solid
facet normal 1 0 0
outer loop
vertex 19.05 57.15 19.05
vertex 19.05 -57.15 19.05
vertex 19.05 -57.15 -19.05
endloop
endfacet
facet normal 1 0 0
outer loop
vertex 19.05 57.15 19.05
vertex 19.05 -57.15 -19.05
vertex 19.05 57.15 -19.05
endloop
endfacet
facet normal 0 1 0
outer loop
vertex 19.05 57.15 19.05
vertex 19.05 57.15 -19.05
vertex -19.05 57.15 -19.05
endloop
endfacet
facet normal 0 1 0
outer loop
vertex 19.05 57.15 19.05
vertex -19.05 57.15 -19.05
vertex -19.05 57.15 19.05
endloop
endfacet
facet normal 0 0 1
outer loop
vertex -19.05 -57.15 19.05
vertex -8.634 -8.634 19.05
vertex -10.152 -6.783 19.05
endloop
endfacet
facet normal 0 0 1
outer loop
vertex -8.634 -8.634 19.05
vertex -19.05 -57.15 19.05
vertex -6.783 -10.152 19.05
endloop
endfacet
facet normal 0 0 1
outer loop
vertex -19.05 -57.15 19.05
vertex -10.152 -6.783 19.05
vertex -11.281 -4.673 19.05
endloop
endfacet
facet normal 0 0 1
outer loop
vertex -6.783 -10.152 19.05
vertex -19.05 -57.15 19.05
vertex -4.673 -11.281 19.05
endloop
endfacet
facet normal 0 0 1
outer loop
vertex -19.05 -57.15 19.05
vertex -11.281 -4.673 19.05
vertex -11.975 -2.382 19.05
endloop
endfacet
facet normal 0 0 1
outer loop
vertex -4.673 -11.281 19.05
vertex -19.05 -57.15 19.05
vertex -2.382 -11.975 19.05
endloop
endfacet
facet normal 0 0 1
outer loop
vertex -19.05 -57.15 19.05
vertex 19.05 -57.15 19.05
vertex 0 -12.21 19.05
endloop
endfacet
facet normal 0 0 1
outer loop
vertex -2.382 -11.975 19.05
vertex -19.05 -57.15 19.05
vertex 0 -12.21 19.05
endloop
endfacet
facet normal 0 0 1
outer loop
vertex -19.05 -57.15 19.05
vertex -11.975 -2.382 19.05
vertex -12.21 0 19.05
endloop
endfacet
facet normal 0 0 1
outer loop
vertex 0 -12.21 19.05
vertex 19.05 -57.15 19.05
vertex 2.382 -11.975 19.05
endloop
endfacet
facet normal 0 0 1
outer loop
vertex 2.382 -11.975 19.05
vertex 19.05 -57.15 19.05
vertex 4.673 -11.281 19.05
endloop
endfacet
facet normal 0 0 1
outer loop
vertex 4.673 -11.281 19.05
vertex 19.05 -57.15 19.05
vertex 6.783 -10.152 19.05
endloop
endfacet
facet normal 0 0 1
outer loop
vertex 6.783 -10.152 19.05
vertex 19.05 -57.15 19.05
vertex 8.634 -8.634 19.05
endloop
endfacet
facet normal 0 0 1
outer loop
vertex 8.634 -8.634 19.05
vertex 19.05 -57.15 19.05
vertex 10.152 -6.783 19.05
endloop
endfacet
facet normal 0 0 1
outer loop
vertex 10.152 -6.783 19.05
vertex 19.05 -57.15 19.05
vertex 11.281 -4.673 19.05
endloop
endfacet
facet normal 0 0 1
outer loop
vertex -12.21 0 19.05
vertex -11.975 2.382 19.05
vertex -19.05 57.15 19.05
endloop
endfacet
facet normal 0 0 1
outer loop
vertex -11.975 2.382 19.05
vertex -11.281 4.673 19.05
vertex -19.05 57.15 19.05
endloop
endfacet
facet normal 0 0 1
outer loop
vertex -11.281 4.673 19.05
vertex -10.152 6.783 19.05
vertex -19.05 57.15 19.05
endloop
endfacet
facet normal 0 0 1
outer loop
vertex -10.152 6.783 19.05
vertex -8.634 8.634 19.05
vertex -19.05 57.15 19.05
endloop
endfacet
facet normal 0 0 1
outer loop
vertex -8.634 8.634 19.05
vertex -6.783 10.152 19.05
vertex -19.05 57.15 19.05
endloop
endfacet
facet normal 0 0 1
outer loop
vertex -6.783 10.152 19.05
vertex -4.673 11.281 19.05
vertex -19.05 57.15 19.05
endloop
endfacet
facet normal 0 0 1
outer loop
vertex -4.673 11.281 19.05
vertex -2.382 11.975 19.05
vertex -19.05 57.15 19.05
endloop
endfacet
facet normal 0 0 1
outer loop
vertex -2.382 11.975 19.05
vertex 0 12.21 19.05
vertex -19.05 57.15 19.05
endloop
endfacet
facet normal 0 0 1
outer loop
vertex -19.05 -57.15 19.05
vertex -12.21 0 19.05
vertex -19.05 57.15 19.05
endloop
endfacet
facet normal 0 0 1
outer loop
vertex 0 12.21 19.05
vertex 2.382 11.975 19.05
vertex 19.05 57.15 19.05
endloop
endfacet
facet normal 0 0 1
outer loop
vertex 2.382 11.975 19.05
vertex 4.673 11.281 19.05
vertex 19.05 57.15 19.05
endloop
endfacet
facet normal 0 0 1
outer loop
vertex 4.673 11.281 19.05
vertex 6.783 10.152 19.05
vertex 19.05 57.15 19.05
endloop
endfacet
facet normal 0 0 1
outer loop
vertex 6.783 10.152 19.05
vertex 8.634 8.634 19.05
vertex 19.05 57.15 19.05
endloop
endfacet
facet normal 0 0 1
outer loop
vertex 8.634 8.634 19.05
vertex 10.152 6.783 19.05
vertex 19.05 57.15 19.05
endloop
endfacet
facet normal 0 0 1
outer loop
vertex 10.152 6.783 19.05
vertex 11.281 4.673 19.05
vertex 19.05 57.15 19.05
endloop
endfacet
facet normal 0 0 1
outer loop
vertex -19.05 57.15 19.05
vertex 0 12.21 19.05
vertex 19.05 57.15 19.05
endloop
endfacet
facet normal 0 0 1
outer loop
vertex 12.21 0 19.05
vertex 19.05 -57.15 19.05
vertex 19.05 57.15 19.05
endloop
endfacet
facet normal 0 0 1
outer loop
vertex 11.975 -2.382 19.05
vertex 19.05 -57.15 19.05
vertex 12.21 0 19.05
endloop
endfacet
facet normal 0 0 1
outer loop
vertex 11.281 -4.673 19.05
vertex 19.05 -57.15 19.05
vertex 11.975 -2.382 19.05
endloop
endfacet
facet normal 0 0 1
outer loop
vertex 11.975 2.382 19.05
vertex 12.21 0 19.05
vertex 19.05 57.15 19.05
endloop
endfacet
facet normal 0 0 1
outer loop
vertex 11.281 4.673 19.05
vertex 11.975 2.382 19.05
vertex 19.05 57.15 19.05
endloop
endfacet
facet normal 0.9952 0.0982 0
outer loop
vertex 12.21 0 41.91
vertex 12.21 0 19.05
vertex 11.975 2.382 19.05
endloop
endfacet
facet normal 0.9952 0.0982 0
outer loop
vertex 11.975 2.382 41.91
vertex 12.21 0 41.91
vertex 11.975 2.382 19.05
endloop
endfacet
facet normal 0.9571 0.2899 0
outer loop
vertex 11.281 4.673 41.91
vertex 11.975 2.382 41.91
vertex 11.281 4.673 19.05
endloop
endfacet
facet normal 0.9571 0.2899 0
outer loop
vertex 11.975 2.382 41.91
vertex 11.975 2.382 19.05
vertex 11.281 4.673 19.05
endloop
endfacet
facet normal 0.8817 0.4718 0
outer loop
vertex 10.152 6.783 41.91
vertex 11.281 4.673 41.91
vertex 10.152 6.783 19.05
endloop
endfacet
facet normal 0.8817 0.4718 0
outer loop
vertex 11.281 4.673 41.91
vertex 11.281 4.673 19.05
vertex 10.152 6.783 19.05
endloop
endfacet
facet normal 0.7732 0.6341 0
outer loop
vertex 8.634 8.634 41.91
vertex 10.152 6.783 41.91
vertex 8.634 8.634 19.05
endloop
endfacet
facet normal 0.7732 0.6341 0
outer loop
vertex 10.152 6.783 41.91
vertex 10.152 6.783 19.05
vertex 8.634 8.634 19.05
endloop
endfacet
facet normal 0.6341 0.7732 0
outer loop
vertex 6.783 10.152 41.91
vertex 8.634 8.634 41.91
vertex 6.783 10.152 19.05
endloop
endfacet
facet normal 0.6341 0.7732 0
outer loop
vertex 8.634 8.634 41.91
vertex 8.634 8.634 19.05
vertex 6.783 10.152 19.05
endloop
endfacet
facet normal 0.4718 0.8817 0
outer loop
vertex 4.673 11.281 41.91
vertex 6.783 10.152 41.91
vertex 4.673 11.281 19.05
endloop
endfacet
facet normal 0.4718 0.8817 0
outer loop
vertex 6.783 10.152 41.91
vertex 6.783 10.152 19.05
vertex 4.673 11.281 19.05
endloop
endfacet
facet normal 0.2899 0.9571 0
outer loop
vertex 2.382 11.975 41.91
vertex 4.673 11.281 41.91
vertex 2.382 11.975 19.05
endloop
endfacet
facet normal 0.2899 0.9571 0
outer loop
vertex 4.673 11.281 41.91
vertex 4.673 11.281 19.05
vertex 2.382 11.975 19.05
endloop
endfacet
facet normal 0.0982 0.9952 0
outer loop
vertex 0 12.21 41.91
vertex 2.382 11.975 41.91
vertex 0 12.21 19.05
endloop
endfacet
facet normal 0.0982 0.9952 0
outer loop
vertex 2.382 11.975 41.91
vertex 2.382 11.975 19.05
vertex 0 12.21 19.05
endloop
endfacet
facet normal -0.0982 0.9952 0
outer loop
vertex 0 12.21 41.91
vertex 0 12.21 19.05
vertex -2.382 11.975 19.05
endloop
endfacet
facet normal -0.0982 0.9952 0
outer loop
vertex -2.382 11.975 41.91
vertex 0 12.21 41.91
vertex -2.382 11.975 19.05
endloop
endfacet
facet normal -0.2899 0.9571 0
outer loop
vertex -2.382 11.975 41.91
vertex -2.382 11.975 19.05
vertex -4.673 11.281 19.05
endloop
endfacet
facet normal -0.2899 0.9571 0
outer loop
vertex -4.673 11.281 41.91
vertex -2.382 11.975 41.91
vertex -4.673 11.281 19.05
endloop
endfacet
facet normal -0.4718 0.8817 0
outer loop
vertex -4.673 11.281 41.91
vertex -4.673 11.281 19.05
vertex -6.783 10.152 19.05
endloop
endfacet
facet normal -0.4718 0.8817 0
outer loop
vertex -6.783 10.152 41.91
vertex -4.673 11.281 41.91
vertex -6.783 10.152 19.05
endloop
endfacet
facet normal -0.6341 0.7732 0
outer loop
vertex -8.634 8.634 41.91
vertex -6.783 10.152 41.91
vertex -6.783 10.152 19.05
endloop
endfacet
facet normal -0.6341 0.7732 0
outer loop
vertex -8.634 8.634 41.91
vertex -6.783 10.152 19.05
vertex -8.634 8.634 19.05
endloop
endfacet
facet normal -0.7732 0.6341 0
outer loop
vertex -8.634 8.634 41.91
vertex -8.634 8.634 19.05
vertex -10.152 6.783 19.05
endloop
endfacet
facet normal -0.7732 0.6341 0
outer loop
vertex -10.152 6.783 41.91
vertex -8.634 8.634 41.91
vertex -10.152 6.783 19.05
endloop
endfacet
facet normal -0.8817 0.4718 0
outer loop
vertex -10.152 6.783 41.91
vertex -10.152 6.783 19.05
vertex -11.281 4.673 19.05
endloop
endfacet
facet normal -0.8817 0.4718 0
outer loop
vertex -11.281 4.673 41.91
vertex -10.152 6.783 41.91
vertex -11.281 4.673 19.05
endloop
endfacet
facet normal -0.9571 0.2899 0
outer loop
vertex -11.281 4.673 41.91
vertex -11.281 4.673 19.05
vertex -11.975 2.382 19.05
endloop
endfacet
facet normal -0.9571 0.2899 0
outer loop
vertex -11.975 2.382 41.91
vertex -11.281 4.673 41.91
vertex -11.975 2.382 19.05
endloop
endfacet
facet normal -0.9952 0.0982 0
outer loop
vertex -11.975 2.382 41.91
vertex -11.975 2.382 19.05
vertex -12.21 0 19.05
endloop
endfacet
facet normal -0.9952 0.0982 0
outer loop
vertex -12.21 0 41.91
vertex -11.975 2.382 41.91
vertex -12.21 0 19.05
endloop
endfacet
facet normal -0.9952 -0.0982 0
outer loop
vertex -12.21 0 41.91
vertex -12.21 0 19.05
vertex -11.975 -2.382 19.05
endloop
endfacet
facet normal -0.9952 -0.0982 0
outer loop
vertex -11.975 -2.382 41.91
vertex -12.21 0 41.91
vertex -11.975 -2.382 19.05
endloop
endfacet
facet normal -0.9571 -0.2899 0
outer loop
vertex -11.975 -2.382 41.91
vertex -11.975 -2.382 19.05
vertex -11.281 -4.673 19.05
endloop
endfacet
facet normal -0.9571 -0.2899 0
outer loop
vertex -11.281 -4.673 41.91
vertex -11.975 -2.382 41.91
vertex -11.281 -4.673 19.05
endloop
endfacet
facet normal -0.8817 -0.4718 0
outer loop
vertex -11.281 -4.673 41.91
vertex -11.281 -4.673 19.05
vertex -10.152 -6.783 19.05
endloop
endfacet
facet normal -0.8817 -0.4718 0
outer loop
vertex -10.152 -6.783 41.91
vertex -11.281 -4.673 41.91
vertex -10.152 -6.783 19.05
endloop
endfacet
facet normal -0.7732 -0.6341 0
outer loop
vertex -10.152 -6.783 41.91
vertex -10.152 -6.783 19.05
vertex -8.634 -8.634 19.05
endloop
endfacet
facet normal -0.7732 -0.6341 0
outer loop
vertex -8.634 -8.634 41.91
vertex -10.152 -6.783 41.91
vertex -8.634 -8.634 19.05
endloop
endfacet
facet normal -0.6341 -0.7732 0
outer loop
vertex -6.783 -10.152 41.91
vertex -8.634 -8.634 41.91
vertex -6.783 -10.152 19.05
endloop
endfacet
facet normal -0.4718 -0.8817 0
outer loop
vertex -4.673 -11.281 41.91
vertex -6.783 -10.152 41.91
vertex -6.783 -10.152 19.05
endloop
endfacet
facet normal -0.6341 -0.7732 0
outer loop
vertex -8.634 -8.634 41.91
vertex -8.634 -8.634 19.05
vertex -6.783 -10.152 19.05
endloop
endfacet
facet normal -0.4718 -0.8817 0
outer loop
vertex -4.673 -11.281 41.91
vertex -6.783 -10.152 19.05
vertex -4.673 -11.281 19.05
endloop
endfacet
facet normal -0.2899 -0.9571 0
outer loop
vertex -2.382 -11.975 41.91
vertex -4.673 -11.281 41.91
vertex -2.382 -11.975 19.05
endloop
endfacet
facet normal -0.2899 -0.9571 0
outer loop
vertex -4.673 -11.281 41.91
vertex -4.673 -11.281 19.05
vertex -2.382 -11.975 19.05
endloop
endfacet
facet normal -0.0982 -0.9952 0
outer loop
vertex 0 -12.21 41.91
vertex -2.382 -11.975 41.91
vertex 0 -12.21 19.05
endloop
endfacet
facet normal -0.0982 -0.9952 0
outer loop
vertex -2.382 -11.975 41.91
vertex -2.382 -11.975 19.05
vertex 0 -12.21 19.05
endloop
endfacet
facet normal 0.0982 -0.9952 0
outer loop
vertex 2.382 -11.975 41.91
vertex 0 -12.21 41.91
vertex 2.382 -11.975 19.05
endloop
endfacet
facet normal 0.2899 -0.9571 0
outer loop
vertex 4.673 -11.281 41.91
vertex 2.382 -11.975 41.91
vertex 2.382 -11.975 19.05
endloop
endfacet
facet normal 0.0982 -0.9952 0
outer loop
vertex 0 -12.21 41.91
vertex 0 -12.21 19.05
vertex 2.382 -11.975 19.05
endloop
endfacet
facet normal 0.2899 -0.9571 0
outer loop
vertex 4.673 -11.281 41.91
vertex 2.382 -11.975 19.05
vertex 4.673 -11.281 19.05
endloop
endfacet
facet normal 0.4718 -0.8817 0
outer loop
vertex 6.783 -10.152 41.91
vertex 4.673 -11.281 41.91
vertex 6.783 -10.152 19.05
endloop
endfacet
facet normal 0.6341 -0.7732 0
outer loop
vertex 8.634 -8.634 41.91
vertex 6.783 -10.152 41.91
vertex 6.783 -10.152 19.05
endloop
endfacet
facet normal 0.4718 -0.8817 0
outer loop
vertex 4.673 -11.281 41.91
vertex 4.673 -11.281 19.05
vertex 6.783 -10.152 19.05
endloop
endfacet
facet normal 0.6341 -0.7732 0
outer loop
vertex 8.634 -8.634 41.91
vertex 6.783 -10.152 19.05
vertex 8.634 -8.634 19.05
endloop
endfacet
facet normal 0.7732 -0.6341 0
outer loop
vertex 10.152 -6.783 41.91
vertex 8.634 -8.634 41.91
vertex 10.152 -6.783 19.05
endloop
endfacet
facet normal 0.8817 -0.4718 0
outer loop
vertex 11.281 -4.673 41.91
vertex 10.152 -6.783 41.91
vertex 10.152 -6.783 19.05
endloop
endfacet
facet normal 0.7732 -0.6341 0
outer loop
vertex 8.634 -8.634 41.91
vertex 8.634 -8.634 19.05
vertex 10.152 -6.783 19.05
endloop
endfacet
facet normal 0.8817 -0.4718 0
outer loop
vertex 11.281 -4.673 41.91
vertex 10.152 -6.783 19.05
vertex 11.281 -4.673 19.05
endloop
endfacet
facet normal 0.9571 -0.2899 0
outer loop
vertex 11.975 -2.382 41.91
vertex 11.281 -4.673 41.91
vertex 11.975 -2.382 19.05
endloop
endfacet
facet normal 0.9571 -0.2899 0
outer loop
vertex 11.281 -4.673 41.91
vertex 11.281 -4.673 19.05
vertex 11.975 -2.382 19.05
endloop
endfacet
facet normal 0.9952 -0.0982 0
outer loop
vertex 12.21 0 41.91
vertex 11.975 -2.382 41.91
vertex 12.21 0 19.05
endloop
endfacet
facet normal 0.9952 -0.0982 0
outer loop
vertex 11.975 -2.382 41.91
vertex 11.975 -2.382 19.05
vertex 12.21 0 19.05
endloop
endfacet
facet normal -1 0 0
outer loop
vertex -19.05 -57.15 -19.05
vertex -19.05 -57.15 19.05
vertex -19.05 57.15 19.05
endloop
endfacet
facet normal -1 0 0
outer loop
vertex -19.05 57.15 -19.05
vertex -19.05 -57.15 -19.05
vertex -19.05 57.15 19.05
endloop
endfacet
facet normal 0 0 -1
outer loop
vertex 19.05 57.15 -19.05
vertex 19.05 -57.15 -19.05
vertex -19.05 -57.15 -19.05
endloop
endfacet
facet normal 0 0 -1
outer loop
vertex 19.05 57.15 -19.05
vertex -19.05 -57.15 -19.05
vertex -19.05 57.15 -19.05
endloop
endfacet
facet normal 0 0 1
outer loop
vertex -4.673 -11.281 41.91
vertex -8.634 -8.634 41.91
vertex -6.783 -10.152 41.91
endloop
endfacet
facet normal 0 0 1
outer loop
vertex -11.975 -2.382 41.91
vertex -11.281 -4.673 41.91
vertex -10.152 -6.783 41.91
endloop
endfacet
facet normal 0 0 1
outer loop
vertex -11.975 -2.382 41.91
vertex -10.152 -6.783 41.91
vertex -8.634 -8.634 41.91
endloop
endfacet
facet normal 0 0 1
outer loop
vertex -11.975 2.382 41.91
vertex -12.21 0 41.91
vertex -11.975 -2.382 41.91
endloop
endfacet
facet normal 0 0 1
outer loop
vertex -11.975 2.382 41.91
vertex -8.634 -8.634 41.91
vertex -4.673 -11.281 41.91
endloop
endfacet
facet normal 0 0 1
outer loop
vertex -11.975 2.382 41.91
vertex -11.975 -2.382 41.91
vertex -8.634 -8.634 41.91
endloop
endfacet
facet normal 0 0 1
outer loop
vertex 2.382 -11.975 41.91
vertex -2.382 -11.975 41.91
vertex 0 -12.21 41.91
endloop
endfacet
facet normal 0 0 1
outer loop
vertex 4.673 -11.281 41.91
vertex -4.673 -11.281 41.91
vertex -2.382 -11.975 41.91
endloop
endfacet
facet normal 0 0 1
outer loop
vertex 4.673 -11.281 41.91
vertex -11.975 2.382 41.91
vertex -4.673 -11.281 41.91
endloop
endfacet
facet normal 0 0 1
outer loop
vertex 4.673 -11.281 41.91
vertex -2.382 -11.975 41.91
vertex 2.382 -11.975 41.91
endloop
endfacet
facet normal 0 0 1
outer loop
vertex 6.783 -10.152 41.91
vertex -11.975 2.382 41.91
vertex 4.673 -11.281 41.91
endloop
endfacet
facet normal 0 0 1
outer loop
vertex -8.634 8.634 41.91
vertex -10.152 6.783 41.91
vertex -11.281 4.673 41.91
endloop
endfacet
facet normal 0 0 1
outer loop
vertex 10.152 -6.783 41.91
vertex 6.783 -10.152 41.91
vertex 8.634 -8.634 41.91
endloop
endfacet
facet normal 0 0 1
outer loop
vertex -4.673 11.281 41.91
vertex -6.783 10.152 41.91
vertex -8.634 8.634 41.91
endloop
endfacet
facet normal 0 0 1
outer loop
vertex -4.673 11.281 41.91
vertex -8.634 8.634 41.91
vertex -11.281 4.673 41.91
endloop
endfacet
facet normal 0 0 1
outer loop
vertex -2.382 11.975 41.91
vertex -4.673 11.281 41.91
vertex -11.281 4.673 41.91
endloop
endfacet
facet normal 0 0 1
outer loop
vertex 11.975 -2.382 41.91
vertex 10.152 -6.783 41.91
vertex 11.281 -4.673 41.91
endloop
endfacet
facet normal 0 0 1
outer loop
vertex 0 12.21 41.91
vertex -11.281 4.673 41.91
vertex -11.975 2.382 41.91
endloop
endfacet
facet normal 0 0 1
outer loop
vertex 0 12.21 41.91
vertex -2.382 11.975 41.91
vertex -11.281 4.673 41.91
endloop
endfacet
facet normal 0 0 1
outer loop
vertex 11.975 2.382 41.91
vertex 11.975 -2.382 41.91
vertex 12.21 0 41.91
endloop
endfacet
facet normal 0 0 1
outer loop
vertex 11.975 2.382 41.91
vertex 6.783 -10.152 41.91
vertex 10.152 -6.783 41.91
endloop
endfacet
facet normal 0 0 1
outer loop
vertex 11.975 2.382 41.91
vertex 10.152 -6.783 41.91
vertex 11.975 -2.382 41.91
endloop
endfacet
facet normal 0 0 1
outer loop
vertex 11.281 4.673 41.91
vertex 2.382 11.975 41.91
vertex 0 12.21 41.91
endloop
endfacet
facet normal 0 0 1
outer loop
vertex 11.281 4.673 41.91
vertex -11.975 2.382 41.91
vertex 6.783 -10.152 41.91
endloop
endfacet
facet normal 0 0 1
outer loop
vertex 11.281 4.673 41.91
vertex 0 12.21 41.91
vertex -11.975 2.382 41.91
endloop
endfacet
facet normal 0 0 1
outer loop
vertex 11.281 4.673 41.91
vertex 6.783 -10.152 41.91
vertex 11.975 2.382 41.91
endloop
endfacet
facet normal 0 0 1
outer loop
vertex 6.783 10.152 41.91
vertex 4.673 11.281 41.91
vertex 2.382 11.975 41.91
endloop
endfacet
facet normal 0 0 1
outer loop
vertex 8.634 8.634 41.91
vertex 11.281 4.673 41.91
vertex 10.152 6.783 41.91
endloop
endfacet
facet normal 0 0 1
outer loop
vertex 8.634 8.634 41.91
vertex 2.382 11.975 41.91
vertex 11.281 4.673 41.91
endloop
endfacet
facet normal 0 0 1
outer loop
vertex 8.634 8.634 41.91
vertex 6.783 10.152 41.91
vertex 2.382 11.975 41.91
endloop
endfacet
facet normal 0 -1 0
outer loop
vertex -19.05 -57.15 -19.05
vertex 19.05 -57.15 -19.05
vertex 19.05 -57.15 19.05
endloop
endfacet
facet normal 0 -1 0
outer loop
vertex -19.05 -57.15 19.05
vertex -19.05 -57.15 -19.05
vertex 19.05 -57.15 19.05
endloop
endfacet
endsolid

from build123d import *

# Parameters (mm, degrees)
F1_R     = 12.209968
F2_DEPTH = 41.91
F0_W     = 114.3
F0_H     = 38.1
F3_DEPTH = 19.05


with BuildPart() as f2:
    # F1 (on Top) → F2 (new body)
    with BuildSketch(Plane.XY):
        Circle(F1_R)
    extrude(amount=F2_DEPTH)

    # F0 (on Right) → F3 (join, symmetric)
    with BuildSketch(Plane.YZ):
        Rectangle(F0_W, F0_H)
    extrude(amount=F3_DEPTH, both=True)


solid = f2.part
